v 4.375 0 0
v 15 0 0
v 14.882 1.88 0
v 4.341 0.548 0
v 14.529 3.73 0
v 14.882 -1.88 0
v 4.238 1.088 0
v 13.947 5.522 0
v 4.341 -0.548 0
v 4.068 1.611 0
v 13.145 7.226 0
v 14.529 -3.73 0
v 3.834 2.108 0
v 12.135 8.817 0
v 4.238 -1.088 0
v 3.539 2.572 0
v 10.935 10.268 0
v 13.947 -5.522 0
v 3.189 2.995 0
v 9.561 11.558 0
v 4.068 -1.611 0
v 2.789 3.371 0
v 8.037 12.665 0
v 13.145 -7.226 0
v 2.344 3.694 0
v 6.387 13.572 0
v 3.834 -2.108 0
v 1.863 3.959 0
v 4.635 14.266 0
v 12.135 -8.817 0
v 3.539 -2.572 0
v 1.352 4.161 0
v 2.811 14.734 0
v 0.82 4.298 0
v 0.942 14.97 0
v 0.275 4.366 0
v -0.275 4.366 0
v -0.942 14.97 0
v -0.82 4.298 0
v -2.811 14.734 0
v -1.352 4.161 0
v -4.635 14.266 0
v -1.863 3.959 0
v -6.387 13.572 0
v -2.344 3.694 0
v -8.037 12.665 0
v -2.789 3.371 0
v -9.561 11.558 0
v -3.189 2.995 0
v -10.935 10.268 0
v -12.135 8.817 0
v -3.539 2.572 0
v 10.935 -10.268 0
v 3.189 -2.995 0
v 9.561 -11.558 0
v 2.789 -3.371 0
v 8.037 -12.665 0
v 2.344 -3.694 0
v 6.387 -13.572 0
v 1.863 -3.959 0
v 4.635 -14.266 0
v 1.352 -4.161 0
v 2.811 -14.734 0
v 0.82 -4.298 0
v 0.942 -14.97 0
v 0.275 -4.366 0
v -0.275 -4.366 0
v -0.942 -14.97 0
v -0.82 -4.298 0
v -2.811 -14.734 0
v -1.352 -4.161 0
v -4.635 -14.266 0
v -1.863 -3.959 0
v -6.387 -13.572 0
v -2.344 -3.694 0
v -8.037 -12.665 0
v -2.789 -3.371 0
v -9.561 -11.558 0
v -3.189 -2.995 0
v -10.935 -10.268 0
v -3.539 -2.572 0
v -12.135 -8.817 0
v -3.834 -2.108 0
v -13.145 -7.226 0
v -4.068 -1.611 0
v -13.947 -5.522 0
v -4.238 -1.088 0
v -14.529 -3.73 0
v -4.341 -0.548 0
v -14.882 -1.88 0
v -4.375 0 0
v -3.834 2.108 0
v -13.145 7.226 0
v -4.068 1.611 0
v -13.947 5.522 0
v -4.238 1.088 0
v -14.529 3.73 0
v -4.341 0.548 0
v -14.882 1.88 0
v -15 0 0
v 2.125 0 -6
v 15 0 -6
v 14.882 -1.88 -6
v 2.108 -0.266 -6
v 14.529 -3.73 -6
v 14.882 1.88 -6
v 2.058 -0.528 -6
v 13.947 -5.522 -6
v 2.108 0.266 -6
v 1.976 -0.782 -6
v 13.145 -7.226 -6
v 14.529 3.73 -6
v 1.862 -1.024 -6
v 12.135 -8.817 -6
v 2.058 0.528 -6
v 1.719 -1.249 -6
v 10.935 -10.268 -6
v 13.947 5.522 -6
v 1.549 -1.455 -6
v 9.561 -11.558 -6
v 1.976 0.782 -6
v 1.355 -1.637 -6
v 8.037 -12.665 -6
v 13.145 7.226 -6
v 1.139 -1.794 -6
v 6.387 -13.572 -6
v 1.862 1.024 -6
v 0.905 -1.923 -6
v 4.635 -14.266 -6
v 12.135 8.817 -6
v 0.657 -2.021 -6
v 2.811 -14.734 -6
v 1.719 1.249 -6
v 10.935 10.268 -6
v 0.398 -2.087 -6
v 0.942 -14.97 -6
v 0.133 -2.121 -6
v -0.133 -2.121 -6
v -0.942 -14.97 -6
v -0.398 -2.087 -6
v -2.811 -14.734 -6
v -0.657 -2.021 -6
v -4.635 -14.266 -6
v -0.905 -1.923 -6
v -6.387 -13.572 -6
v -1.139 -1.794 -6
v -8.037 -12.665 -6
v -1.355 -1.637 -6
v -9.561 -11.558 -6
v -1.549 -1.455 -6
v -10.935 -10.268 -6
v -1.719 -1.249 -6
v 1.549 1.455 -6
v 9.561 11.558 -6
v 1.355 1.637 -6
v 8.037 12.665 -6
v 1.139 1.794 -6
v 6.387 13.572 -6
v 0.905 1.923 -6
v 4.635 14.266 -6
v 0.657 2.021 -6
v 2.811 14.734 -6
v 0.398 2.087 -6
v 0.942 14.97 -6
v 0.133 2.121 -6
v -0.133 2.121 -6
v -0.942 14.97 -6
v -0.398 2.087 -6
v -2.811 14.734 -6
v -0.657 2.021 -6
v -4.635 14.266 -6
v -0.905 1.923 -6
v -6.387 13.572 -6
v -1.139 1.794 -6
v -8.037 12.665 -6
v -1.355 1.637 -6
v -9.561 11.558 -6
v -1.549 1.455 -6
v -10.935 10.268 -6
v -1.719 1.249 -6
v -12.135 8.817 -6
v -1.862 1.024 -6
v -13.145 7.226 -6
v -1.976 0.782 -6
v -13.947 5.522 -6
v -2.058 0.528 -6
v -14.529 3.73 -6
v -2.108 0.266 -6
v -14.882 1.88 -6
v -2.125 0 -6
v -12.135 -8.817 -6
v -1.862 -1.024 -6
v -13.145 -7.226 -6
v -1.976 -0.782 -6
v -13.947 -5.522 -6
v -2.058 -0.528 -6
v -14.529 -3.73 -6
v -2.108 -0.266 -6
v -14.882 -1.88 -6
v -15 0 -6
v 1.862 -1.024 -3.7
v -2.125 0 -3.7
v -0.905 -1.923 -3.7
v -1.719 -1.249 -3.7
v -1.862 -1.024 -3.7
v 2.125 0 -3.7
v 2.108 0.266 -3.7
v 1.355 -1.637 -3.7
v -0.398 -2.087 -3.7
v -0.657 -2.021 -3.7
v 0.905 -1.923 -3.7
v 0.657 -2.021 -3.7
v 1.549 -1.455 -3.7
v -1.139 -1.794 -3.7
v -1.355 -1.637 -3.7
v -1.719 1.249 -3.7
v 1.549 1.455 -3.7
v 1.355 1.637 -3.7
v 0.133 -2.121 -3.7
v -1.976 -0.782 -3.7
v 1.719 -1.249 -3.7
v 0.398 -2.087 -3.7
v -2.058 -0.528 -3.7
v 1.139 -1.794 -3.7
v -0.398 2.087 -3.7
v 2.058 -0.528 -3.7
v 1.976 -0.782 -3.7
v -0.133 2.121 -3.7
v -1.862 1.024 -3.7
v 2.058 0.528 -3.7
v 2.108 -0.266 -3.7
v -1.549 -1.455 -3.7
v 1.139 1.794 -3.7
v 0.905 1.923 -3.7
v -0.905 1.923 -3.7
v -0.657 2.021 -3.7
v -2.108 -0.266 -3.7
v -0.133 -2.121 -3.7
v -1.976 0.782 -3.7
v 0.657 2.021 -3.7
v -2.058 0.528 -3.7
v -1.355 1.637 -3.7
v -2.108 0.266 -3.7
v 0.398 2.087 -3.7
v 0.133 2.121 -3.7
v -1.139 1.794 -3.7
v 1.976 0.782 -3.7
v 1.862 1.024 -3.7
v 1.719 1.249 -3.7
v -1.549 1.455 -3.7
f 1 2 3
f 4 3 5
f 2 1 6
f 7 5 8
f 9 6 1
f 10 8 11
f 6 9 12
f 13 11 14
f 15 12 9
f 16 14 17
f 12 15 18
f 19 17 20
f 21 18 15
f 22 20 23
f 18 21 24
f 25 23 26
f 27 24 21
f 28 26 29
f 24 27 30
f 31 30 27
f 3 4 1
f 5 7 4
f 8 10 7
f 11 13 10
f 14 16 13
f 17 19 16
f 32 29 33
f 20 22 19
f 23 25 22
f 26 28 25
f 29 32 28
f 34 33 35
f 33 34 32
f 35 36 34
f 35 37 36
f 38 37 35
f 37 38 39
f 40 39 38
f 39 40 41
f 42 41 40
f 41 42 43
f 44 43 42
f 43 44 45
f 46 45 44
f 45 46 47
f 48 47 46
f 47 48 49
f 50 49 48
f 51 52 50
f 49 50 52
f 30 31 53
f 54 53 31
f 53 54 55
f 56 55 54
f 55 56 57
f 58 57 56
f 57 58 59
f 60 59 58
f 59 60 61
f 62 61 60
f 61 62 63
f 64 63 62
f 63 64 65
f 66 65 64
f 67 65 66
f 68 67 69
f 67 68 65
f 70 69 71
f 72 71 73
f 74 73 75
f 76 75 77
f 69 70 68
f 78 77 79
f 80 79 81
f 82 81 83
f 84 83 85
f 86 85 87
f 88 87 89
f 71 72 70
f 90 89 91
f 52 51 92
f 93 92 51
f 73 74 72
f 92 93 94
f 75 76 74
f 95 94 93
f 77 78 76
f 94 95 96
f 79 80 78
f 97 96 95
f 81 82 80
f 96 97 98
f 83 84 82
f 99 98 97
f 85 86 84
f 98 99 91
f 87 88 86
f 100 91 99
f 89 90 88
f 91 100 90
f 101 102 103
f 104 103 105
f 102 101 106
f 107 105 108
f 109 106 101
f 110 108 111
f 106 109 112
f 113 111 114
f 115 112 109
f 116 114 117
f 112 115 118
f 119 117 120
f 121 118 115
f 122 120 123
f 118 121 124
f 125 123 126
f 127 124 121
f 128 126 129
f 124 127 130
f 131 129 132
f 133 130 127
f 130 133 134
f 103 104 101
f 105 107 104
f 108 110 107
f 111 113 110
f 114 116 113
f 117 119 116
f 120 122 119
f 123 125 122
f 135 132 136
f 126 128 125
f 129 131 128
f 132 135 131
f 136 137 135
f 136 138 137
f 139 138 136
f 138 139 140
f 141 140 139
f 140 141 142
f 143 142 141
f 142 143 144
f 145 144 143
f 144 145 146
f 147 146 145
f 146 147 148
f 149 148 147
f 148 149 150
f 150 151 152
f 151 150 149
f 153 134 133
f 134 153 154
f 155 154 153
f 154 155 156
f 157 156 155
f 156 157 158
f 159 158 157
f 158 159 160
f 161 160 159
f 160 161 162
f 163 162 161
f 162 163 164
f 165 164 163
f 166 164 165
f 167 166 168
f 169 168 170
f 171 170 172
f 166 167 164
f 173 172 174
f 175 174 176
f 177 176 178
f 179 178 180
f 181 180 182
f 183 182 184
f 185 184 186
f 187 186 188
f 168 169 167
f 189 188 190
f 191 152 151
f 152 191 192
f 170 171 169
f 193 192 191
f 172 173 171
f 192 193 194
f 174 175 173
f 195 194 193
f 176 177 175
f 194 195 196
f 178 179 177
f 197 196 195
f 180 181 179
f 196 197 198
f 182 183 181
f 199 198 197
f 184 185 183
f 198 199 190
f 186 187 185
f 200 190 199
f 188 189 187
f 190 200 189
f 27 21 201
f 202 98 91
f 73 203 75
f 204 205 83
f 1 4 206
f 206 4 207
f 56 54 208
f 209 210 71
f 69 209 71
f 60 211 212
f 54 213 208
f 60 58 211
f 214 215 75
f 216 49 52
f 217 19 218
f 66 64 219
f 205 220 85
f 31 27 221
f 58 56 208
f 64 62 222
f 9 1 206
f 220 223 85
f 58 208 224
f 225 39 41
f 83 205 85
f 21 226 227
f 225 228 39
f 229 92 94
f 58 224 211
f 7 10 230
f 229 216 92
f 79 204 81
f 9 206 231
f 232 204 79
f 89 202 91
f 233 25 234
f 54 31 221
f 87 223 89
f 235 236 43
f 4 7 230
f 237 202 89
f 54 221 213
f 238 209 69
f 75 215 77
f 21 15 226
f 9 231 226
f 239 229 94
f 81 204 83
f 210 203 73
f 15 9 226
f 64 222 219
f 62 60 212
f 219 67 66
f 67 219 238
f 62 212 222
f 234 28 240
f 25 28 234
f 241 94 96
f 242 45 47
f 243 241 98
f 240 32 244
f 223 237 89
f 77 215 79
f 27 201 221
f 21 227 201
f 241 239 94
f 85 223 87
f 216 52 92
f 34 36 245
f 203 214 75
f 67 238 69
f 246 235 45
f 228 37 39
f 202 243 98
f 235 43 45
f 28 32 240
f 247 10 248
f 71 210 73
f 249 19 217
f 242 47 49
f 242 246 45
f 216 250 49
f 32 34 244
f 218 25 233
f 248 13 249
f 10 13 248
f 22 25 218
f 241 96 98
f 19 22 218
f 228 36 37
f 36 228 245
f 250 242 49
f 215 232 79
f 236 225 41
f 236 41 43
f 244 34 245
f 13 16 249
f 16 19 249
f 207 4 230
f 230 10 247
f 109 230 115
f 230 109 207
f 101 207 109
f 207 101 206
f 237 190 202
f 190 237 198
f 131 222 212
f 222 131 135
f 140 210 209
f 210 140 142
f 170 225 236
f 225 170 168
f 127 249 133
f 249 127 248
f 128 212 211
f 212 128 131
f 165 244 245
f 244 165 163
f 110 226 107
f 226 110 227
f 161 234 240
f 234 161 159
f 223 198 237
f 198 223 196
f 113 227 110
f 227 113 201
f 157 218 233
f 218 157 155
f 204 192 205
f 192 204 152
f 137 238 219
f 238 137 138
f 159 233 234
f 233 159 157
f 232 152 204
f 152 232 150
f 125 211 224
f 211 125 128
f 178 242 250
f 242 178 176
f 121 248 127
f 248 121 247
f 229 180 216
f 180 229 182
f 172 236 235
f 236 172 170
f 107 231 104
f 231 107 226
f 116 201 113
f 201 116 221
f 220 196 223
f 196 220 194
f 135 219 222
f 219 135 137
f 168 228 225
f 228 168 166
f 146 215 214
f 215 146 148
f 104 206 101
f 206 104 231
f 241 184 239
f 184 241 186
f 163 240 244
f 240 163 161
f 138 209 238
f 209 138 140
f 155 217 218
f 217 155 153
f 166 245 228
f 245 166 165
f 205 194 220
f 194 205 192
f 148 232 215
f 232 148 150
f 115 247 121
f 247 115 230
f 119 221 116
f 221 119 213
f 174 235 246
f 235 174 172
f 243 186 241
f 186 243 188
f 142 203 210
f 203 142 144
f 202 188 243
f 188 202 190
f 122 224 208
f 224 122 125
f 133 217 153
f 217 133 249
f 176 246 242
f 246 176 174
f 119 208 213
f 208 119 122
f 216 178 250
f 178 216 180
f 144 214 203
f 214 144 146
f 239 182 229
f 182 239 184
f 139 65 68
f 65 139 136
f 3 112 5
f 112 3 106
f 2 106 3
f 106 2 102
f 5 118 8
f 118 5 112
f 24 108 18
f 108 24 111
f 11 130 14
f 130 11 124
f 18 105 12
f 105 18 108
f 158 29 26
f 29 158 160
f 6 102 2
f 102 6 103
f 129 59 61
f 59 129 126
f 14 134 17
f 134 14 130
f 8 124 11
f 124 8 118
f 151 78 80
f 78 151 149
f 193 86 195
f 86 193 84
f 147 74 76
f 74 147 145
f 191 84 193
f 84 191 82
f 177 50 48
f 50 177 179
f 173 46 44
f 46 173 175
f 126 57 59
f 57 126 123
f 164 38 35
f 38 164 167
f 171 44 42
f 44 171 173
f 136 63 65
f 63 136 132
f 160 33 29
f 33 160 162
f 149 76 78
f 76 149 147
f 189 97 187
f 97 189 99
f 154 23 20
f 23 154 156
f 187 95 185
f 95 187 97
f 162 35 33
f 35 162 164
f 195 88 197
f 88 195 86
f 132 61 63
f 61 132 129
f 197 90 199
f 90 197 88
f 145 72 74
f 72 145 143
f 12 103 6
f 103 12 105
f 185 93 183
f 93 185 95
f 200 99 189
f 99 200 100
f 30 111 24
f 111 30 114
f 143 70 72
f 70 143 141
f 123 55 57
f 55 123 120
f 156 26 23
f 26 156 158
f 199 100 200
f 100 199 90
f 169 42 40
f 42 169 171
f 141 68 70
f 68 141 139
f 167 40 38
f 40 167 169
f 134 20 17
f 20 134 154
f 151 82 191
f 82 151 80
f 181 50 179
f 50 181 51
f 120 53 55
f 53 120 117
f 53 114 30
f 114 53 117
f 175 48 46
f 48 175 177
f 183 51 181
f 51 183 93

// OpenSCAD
$fn = 50;


difference() {
	union() {
		translate(v = [0, 0, -6.0000000000]) {
			cylinder(h = 6, r = 15.0000000000);
		}
	}
	union() {
		translate(v = [0, 0, 0]) {
			rotate(a = [0, 0, 0]) {
				difference() {
					union() {
						translate(v = [0, 0, -6.0000000000]) {
							cylinder(h = 6, r = 2.0000000000);
						}
						translate(v = [0, 0, -3.7000000000]) {
							cylinder(h = 3.7000000000, r1 = 2.1250000000, r2 = 4.3750000000);
						}
						translate(v = [0, 0, -6.0000000000]) {
							cylinder(h = 6, r = 2.1250000000);
						}
						translate(v = [0, 0, -6.0000000000]) {
							cylinder(h = 6, r = 2.0000000000);
						}
					}
					union();
				}
			}
		}
	}
}
